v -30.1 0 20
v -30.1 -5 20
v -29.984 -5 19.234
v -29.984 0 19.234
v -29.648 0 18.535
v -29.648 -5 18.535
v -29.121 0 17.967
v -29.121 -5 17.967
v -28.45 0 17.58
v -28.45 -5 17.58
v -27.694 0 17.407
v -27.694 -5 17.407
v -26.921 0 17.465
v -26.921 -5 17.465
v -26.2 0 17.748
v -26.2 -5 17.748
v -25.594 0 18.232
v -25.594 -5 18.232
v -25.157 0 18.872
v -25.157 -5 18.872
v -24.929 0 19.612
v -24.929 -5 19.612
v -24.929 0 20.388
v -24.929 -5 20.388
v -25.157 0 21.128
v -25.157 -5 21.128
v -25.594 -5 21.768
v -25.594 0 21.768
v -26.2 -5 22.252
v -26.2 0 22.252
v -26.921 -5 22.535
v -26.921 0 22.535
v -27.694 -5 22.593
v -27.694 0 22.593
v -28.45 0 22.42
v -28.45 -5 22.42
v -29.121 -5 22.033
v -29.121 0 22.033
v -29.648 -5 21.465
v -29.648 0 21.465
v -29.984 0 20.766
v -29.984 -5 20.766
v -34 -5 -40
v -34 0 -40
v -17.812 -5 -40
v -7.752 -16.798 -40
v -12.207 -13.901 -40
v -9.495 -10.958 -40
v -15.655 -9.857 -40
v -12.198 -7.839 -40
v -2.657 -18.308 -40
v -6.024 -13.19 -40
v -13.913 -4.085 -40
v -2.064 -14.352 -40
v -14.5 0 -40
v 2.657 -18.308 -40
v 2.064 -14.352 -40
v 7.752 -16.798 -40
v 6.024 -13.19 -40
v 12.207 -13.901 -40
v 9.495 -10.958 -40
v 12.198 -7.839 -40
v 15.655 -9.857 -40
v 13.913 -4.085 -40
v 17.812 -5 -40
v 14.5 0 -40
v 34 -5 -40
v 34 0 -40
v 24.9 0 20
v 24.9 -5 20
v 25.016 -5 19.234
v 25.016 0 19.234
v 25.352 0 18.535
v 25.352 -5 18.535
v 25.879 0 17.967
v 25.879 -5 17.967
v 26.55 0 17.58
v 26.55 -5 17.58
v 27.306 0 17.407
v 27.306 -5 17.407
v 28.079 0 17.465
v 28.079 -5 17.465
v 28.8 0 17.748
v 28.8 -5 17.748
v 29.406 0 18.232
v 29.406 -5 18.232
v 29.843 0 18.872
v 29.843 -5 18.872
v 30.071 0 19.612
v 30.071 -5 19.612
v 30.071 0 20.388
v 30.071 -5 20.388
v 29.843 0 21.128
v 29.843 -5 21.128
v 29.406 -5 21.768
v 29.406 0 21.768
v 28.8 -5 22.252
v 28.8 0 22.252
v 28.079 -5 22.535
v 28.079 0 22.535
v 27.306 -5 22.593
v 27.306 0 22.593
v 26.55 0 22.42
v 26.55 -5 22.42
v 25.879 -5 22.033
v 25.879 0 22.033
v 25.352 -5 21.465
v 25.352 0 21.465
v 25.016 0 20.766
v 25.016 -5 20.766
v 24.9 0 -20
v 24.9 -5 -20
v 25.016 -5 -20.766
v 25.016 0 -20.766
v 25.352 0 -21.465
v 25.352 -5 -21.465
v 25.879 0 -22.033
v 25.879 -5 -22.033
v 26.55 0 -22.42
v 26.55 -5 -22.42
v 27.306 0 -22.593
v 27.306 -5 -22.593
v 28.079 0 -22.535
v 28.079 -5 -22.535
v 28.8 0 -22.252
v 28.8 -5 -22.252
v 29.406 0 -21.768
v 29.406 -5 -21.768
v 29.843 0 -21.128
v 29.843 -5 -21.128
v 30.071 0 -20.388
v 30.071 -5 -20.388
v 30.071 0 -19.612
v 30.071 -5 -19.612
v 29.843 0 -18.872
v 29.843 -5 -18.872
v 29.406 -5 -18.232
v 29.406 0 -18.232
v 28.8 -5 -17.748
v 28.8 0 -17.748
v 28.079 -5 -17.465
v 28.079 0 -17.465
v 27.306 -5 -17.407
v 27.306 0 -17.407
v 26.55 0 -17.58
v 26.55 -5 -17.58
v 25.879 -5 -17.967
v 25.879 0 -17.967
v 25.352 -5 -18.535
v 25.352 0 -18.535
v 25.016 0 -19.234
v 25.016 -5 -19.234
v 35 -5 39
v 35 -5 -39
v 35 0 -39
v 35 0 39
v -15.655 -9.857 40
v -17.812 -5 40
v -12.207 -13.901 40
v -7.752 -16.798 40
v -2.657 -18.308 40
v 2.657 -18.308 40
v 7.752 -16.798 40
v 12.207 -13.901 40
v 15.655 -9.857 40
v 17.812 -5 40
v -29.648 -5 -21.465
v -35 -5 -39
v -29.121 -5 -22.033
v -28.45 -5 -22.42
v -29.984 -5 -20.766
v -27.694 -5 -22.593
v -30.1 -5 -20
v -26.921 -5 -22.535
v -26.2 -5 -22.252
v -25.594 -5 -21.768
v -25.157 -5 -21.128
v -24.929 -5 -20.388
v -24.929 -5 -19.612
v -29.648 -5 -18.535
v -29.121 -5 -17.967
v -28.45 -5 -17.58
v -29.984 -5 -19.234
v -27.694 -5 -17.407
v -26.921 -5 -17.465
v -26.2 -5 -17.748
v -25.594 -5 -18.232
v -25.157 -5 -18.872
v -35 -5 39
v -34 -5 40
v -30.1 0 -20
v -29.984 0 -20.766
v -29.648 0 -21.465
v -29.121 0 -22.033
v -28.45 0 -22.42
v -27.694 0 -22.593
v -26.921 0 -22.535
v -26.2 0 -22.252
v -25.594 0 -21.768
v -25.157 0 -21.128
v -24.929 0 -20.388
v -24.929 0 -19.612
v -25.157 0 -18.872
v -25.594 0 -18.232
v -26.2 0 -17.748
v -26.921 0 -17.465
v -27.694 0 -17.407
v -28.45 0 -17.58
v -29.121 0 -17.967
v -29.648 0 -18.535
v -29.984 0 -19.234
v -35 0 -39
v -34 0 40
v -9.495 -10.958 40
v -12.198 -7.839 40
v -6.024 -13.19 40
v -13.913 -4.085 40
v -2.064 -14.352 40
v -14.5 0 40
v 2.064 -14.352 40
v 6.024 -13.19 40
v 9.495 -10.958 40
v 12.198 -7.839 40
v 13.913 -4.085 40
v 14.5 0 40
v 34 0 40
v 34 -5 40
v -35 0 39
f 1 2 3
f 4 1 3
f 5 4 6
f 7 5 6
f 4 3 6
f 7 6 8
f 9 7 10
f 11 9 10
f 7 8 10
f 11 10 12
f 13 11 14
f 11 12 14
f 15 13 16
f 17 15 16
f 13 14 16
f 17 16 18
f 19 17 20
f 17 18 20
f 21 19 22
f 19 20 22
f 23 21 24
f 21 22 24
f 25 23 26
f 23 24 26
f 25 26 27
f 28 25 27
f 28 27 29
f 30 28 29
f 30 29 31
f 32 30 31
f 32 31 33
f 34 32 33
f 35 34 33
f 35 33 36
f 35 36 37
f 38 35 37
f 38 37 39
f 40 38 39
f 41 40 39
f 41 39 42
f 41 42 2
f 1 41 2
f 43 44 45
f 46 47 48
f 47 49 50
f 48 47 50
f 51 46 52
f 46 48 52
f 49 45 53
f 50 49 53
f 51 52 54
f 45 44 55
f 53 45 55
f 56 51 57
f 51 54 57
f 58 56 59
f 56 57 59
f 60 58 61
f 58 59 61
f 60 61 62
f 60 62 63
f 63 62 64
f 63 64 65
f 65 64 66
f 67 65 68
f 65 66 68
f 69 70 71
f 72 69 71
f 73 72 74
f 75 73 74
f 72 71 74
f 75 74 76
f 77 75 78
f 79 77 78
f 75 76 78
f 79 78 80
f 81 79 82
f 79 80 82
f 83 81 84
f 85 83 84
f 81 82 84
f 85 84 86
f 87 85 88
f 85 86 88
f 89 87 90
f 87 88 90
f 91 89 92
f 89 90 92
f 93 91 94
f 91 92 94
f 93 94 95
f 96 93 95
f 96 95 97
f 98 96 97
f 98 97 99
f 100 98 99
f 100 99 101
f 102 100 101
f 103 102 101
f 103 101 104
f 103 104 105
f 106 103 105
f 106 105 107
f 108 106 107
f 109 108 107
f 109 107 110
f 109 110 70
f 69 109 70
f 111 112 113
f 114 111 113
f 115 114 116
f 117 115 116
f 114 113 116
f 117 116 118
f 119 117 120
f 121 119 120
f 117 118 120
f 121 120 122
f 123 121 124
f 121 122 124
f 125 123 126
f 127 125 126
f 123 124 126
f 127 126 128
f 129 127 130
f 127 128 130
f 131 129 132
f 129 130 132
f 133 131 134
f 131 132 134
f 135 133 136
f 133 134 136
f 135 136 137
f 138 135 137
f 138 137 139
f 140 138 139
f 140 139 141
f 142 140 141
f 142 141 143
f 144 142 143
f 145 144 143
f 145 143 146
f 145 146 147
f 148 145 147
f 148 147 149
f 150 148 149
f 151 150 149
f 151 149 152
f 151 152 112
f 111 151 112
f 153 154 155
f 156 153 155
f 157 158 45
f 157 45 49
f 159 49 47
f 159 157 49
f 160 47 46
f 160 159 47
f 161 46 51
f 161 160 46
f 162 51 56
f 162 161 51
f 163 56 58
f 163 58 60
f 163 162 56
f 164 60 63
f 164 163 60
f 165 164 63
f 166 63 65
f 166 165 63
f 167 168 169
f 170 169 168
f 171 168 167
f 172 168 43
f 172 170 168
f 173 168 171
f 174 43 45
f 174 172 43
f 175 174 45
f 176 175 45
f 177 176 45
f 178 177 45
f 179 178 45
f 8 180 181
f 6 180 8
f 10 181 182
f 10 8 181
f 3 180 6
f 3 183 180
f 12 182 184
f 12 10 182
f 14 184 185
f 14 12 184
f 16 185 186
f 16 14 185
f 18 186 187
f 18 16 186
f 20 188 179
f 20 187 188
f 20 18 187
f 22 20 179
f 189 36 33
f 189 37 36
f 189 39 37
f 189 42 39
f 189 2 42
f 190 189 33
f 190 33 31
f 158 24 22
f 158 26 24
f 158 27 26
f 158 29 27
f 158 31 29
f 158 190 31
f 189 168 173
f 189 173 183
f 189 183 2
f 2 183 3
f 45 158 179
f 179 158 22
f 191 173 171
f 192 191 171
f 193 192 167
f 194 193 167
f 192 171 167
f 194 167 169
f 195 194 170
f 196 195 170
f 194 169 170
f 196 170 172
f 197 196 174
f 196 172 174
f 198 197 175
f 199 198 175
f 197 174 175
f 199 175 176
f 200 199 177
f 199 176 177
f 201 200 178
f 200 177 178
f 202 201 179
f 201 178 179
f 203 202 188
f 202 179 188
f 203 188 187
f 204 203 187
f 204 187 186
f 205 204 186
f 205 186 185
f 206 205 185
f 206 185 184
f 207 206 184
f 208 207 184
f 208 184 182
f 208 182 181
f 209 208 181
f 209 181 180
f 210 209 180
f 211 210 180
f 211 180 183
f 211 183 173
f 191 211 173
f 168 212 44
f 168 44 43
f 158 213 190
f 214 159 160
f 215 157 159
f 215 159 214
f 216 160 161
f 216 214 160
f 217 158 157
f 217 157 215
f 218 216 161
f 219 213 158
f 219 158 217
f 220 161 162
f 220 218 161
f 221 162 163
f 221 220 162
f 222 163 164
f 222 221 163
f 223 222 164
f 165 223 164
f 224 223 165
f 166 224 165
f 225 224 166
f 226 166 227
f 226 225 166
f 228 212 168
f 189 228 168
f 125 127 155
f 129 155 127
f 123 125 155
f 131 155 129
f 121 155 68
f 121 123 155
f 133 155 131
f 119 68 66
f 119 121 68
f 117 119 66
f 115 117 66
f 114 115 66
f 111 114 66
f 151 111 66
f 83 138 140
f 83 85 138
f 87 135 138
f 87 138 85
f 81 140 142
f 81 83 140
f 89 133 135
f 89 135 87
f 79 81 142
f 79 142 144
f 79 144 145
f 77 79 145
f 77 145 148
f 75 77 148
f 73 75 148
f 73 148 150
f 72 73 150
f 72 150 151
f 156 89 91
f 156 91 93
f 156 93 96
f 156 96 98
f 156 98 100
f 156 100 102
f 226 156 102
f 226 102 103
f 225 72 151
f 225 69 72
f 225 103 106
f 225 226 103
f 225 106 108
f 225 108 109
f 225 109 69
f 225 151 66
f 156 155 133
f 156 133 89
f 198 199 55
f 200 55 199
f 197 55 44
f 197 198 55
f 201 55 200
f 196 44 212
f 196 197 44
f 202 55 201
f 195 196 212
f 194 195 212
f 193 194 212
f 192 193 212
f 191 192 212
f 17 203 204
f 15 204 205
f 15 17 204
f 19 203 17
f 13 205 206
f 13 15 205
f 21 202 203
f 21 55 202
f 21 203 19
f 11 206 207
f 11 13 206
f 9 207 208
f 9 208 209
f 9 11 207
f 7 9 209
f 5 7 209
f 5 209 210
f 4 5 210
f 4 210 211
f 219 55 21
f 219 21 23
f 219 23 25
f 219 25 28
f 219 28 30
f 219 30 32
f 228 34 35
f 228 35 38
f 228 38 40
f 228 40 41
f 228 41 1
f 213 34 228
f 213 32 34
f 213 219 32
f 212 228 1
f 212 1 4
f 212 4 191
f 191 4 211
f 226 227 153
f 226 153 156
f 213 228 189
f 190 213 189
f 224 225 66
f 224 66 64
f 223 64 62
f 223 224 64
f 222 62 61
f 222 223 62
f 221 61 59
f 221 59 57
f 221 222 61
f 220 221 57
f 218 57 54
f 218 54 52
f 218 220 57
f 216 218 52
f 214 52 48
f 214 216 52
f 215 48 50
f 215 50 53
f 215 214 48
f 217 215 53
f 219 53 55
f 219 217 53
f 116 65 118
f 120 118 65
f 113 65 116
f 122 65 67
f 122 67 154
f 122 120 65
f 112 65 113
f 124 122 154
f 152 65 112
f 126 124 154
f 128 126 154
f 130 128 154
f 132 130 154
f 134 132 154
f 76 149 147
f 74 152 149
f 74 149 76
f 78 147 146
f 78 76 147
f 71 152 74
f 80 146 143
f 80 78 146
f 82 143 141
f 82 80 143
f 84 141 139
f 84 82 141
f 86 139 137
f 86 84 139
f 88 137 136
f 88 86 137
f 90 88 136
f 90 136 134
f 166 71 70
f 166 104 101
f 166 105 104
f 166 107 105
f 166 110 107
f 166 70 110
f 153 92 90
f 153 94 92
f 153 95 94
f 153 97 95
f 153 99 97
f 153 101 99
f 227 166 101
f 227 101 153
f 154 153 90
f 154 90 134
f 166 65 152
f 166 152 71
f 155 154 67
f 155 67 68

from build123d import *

# Parameters (mm, degrees)
EXTRUDE_1_DEPTH     = 40
SKETCH_2_R          = 2.6
CUT_EXTRUDE_1_DEPTH = 10
CHAMFER_1_SIZE      = 1


with BuildPart() as part:
    # 草图1 → 凸台-拉伸1 (new body, symmetric)
    with BuildSketch(Plane.XY):
        with BuildLine():
            Line((35, 0), (14.5, 0))
            ThreePointArc((14.5, 0), (0, -14.5), (-14.5, 0))
            Line((-14.5, 0), (-35, 0))
            Line((-35, 0), (-35, -5))
            Line((-35, -5), (-21.937410968, -5))
            Line((-21.937410968, -5), (-17.811513131, -5))
            ThreePointArc((-17.811513131, -5), (0, -18.5), (17.811513131, -5))
            Line((17.811513131, -5), (21.937410968, -5))
            Line((21.937410968, -5), (35, -5))
            Line((35, -5), (35, 0))
        make_face()
    extrude(amount=EXTRUDE_1_DEPTH, both=True)

    # 草图2 → 切除-拉伸1 (cut)
    with BuildSketch(Plane(origin=(0, -5, 0), x_dir=(-1, 0, 0), z_dir=(0, -1, 0))):
        with Locations((27.5, -20)):
            Circle(SKETCH_2_R)
        with Locations((27.5, 20)):
            Circle(SKETCH_2_R)
        with Locations((-27.5, -20)):
            Circle(SKETCH_2_R)
        with Locations((-27.5, 20)):
            Circle(SKETCH_2_R)
    extrude(amount=-CUT_EXTRUDE_1_DEPTH, mode=Mode.SUBTRACT)

    # 倒角1
    chamfer_1_edges = [part.edges().sort_by_distance(p)[0] for p in [
        (-35, -2.5, -40),
        (35, -2.5, -40),
        (-35, -2.5, 40),
        (35, -2.5, 40),
    ]]
    chamfer(chamfer_1_edges, length=CHAMFER_1_SIZE)


solid = part.part
